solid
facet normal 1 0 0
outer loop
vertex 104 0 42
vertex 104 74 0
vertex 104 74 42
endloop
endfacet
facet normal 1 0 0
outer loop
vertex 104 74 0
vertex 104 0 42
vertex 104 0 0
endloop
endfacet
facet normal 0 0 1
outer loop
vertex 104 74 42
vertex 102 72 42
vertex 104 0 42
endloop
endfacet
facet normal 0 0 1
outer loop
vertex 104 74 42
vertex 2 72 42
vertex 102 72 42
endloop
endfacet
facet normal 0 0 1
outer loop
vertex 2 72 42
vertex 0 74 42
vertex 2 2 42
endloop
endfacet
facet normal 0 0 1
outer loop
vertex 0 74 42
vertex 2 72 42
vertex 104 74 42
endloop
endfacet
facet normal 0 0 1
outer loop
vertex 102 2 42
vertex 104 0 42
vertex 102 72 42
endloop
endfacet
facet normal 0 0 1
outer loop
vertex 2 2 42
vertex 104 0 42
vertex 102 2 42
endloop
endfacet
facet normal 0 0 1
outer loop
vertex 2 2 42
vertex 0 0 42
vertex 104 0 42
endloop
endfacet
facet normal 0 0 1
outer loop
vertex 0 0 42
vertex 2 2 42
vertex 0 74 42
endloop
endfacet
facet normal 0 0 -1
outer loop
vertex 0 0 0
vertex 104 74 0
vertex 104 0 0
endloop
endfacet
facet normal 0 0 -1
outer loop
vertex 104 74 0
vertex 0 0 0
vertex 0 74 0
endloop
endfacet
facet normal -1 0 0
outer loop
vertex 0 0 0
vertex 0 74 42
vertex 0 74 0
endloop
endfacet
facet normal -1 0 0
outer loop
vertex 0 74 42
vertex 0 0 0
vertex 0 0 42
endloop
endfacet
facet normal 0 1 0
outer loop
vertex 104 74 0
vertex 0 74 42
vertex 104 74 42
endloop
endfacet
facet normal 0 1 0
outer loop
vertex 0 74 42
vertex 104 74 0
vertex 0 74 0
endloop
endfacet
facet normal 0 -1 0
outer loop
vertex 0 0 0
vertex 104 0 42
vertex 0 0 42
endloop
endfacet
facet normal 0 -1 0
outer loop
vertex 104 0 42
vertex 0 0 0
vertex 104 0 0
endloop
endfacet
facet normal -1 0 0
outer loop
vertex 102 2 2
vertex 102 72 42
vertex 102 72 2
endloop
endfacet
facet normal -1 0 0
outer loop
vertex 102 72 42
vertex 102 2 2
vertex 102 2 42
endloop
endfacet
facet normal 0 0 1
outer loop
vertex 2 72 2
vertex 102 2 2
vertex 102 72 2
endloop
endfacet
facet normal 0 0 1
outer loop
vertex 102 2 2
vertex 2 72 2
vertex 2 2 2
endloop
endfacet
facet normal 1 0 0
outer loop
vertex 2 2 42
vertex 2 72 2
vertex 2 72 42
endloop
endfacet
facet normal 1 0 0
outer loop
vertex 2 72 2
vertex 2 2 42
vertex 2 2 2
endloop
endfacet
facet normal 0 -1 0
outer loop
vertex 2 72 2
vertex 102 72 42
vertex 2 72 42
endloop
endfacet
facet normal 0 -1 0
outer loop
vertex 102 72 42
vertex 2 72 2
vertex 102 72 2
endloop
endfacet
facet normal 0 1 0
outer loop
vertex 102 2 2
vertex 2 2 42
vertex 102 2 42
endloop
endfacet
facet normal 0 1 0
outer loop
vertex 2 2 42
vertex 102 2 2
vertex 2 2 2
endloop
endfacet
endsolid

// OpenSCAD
// This is a box with a parameterized interior, thickness, lid tolerance, and lid overhang
interiorLength = 100;
interiorWidth = 70;
interiorHeight = 40;
wallThickness = 2;
lidTolerance = 0.5; // This is the amount larger than the exterior of the box the interior of the lid will be
lidOverhang = 10; // This is the amount that the lid hangs down past the top of the box. A value of 0 would result in a flat surface for the lid.

// Derived Values
wallThicknessVector = [2*wallThickness, 2*wallThickness, wallThickness]; // This can be added to interior dimensions to get the exterior dimensions for the box or lid
interiorDimensions = [interiorLength, interiorWidth, interiorHeight];
exteriorDimensions = interiorDimensions + wallThicknessVector;
lidInteriorDimensions = [exteriorDimensions[0]+(2*lidTolerance), exteriorDimensions[1]+2*lidTolerance, lidOverhang];
lidExteriorDimensions = lidInteriorDimensions + wallThicknessVector;

// Box
difference(){
    cube(exteriorDimensions, center=false);
    translate([wallThickness, wallThickness, wallThickness]){
        cube(interiorDimensions, center=false);
    }
}

// // Lid
// // This flips the lid upside down for viewing
// translate([-1*(wallThickness+lidTolerance), -1*(wallThickness+lidTolerance), exteriorDimensions[2]*1.5]){
//     mirror([0, 0, 1]){
//         difference(){
//             cube(lidExteriorDimensions, center=false);
//             translate([wallThickness, wallThickness, wallThickness]){
//                 cube(lidInteriorDimensions, center=false);
//             }
//         }
//     }
// }
